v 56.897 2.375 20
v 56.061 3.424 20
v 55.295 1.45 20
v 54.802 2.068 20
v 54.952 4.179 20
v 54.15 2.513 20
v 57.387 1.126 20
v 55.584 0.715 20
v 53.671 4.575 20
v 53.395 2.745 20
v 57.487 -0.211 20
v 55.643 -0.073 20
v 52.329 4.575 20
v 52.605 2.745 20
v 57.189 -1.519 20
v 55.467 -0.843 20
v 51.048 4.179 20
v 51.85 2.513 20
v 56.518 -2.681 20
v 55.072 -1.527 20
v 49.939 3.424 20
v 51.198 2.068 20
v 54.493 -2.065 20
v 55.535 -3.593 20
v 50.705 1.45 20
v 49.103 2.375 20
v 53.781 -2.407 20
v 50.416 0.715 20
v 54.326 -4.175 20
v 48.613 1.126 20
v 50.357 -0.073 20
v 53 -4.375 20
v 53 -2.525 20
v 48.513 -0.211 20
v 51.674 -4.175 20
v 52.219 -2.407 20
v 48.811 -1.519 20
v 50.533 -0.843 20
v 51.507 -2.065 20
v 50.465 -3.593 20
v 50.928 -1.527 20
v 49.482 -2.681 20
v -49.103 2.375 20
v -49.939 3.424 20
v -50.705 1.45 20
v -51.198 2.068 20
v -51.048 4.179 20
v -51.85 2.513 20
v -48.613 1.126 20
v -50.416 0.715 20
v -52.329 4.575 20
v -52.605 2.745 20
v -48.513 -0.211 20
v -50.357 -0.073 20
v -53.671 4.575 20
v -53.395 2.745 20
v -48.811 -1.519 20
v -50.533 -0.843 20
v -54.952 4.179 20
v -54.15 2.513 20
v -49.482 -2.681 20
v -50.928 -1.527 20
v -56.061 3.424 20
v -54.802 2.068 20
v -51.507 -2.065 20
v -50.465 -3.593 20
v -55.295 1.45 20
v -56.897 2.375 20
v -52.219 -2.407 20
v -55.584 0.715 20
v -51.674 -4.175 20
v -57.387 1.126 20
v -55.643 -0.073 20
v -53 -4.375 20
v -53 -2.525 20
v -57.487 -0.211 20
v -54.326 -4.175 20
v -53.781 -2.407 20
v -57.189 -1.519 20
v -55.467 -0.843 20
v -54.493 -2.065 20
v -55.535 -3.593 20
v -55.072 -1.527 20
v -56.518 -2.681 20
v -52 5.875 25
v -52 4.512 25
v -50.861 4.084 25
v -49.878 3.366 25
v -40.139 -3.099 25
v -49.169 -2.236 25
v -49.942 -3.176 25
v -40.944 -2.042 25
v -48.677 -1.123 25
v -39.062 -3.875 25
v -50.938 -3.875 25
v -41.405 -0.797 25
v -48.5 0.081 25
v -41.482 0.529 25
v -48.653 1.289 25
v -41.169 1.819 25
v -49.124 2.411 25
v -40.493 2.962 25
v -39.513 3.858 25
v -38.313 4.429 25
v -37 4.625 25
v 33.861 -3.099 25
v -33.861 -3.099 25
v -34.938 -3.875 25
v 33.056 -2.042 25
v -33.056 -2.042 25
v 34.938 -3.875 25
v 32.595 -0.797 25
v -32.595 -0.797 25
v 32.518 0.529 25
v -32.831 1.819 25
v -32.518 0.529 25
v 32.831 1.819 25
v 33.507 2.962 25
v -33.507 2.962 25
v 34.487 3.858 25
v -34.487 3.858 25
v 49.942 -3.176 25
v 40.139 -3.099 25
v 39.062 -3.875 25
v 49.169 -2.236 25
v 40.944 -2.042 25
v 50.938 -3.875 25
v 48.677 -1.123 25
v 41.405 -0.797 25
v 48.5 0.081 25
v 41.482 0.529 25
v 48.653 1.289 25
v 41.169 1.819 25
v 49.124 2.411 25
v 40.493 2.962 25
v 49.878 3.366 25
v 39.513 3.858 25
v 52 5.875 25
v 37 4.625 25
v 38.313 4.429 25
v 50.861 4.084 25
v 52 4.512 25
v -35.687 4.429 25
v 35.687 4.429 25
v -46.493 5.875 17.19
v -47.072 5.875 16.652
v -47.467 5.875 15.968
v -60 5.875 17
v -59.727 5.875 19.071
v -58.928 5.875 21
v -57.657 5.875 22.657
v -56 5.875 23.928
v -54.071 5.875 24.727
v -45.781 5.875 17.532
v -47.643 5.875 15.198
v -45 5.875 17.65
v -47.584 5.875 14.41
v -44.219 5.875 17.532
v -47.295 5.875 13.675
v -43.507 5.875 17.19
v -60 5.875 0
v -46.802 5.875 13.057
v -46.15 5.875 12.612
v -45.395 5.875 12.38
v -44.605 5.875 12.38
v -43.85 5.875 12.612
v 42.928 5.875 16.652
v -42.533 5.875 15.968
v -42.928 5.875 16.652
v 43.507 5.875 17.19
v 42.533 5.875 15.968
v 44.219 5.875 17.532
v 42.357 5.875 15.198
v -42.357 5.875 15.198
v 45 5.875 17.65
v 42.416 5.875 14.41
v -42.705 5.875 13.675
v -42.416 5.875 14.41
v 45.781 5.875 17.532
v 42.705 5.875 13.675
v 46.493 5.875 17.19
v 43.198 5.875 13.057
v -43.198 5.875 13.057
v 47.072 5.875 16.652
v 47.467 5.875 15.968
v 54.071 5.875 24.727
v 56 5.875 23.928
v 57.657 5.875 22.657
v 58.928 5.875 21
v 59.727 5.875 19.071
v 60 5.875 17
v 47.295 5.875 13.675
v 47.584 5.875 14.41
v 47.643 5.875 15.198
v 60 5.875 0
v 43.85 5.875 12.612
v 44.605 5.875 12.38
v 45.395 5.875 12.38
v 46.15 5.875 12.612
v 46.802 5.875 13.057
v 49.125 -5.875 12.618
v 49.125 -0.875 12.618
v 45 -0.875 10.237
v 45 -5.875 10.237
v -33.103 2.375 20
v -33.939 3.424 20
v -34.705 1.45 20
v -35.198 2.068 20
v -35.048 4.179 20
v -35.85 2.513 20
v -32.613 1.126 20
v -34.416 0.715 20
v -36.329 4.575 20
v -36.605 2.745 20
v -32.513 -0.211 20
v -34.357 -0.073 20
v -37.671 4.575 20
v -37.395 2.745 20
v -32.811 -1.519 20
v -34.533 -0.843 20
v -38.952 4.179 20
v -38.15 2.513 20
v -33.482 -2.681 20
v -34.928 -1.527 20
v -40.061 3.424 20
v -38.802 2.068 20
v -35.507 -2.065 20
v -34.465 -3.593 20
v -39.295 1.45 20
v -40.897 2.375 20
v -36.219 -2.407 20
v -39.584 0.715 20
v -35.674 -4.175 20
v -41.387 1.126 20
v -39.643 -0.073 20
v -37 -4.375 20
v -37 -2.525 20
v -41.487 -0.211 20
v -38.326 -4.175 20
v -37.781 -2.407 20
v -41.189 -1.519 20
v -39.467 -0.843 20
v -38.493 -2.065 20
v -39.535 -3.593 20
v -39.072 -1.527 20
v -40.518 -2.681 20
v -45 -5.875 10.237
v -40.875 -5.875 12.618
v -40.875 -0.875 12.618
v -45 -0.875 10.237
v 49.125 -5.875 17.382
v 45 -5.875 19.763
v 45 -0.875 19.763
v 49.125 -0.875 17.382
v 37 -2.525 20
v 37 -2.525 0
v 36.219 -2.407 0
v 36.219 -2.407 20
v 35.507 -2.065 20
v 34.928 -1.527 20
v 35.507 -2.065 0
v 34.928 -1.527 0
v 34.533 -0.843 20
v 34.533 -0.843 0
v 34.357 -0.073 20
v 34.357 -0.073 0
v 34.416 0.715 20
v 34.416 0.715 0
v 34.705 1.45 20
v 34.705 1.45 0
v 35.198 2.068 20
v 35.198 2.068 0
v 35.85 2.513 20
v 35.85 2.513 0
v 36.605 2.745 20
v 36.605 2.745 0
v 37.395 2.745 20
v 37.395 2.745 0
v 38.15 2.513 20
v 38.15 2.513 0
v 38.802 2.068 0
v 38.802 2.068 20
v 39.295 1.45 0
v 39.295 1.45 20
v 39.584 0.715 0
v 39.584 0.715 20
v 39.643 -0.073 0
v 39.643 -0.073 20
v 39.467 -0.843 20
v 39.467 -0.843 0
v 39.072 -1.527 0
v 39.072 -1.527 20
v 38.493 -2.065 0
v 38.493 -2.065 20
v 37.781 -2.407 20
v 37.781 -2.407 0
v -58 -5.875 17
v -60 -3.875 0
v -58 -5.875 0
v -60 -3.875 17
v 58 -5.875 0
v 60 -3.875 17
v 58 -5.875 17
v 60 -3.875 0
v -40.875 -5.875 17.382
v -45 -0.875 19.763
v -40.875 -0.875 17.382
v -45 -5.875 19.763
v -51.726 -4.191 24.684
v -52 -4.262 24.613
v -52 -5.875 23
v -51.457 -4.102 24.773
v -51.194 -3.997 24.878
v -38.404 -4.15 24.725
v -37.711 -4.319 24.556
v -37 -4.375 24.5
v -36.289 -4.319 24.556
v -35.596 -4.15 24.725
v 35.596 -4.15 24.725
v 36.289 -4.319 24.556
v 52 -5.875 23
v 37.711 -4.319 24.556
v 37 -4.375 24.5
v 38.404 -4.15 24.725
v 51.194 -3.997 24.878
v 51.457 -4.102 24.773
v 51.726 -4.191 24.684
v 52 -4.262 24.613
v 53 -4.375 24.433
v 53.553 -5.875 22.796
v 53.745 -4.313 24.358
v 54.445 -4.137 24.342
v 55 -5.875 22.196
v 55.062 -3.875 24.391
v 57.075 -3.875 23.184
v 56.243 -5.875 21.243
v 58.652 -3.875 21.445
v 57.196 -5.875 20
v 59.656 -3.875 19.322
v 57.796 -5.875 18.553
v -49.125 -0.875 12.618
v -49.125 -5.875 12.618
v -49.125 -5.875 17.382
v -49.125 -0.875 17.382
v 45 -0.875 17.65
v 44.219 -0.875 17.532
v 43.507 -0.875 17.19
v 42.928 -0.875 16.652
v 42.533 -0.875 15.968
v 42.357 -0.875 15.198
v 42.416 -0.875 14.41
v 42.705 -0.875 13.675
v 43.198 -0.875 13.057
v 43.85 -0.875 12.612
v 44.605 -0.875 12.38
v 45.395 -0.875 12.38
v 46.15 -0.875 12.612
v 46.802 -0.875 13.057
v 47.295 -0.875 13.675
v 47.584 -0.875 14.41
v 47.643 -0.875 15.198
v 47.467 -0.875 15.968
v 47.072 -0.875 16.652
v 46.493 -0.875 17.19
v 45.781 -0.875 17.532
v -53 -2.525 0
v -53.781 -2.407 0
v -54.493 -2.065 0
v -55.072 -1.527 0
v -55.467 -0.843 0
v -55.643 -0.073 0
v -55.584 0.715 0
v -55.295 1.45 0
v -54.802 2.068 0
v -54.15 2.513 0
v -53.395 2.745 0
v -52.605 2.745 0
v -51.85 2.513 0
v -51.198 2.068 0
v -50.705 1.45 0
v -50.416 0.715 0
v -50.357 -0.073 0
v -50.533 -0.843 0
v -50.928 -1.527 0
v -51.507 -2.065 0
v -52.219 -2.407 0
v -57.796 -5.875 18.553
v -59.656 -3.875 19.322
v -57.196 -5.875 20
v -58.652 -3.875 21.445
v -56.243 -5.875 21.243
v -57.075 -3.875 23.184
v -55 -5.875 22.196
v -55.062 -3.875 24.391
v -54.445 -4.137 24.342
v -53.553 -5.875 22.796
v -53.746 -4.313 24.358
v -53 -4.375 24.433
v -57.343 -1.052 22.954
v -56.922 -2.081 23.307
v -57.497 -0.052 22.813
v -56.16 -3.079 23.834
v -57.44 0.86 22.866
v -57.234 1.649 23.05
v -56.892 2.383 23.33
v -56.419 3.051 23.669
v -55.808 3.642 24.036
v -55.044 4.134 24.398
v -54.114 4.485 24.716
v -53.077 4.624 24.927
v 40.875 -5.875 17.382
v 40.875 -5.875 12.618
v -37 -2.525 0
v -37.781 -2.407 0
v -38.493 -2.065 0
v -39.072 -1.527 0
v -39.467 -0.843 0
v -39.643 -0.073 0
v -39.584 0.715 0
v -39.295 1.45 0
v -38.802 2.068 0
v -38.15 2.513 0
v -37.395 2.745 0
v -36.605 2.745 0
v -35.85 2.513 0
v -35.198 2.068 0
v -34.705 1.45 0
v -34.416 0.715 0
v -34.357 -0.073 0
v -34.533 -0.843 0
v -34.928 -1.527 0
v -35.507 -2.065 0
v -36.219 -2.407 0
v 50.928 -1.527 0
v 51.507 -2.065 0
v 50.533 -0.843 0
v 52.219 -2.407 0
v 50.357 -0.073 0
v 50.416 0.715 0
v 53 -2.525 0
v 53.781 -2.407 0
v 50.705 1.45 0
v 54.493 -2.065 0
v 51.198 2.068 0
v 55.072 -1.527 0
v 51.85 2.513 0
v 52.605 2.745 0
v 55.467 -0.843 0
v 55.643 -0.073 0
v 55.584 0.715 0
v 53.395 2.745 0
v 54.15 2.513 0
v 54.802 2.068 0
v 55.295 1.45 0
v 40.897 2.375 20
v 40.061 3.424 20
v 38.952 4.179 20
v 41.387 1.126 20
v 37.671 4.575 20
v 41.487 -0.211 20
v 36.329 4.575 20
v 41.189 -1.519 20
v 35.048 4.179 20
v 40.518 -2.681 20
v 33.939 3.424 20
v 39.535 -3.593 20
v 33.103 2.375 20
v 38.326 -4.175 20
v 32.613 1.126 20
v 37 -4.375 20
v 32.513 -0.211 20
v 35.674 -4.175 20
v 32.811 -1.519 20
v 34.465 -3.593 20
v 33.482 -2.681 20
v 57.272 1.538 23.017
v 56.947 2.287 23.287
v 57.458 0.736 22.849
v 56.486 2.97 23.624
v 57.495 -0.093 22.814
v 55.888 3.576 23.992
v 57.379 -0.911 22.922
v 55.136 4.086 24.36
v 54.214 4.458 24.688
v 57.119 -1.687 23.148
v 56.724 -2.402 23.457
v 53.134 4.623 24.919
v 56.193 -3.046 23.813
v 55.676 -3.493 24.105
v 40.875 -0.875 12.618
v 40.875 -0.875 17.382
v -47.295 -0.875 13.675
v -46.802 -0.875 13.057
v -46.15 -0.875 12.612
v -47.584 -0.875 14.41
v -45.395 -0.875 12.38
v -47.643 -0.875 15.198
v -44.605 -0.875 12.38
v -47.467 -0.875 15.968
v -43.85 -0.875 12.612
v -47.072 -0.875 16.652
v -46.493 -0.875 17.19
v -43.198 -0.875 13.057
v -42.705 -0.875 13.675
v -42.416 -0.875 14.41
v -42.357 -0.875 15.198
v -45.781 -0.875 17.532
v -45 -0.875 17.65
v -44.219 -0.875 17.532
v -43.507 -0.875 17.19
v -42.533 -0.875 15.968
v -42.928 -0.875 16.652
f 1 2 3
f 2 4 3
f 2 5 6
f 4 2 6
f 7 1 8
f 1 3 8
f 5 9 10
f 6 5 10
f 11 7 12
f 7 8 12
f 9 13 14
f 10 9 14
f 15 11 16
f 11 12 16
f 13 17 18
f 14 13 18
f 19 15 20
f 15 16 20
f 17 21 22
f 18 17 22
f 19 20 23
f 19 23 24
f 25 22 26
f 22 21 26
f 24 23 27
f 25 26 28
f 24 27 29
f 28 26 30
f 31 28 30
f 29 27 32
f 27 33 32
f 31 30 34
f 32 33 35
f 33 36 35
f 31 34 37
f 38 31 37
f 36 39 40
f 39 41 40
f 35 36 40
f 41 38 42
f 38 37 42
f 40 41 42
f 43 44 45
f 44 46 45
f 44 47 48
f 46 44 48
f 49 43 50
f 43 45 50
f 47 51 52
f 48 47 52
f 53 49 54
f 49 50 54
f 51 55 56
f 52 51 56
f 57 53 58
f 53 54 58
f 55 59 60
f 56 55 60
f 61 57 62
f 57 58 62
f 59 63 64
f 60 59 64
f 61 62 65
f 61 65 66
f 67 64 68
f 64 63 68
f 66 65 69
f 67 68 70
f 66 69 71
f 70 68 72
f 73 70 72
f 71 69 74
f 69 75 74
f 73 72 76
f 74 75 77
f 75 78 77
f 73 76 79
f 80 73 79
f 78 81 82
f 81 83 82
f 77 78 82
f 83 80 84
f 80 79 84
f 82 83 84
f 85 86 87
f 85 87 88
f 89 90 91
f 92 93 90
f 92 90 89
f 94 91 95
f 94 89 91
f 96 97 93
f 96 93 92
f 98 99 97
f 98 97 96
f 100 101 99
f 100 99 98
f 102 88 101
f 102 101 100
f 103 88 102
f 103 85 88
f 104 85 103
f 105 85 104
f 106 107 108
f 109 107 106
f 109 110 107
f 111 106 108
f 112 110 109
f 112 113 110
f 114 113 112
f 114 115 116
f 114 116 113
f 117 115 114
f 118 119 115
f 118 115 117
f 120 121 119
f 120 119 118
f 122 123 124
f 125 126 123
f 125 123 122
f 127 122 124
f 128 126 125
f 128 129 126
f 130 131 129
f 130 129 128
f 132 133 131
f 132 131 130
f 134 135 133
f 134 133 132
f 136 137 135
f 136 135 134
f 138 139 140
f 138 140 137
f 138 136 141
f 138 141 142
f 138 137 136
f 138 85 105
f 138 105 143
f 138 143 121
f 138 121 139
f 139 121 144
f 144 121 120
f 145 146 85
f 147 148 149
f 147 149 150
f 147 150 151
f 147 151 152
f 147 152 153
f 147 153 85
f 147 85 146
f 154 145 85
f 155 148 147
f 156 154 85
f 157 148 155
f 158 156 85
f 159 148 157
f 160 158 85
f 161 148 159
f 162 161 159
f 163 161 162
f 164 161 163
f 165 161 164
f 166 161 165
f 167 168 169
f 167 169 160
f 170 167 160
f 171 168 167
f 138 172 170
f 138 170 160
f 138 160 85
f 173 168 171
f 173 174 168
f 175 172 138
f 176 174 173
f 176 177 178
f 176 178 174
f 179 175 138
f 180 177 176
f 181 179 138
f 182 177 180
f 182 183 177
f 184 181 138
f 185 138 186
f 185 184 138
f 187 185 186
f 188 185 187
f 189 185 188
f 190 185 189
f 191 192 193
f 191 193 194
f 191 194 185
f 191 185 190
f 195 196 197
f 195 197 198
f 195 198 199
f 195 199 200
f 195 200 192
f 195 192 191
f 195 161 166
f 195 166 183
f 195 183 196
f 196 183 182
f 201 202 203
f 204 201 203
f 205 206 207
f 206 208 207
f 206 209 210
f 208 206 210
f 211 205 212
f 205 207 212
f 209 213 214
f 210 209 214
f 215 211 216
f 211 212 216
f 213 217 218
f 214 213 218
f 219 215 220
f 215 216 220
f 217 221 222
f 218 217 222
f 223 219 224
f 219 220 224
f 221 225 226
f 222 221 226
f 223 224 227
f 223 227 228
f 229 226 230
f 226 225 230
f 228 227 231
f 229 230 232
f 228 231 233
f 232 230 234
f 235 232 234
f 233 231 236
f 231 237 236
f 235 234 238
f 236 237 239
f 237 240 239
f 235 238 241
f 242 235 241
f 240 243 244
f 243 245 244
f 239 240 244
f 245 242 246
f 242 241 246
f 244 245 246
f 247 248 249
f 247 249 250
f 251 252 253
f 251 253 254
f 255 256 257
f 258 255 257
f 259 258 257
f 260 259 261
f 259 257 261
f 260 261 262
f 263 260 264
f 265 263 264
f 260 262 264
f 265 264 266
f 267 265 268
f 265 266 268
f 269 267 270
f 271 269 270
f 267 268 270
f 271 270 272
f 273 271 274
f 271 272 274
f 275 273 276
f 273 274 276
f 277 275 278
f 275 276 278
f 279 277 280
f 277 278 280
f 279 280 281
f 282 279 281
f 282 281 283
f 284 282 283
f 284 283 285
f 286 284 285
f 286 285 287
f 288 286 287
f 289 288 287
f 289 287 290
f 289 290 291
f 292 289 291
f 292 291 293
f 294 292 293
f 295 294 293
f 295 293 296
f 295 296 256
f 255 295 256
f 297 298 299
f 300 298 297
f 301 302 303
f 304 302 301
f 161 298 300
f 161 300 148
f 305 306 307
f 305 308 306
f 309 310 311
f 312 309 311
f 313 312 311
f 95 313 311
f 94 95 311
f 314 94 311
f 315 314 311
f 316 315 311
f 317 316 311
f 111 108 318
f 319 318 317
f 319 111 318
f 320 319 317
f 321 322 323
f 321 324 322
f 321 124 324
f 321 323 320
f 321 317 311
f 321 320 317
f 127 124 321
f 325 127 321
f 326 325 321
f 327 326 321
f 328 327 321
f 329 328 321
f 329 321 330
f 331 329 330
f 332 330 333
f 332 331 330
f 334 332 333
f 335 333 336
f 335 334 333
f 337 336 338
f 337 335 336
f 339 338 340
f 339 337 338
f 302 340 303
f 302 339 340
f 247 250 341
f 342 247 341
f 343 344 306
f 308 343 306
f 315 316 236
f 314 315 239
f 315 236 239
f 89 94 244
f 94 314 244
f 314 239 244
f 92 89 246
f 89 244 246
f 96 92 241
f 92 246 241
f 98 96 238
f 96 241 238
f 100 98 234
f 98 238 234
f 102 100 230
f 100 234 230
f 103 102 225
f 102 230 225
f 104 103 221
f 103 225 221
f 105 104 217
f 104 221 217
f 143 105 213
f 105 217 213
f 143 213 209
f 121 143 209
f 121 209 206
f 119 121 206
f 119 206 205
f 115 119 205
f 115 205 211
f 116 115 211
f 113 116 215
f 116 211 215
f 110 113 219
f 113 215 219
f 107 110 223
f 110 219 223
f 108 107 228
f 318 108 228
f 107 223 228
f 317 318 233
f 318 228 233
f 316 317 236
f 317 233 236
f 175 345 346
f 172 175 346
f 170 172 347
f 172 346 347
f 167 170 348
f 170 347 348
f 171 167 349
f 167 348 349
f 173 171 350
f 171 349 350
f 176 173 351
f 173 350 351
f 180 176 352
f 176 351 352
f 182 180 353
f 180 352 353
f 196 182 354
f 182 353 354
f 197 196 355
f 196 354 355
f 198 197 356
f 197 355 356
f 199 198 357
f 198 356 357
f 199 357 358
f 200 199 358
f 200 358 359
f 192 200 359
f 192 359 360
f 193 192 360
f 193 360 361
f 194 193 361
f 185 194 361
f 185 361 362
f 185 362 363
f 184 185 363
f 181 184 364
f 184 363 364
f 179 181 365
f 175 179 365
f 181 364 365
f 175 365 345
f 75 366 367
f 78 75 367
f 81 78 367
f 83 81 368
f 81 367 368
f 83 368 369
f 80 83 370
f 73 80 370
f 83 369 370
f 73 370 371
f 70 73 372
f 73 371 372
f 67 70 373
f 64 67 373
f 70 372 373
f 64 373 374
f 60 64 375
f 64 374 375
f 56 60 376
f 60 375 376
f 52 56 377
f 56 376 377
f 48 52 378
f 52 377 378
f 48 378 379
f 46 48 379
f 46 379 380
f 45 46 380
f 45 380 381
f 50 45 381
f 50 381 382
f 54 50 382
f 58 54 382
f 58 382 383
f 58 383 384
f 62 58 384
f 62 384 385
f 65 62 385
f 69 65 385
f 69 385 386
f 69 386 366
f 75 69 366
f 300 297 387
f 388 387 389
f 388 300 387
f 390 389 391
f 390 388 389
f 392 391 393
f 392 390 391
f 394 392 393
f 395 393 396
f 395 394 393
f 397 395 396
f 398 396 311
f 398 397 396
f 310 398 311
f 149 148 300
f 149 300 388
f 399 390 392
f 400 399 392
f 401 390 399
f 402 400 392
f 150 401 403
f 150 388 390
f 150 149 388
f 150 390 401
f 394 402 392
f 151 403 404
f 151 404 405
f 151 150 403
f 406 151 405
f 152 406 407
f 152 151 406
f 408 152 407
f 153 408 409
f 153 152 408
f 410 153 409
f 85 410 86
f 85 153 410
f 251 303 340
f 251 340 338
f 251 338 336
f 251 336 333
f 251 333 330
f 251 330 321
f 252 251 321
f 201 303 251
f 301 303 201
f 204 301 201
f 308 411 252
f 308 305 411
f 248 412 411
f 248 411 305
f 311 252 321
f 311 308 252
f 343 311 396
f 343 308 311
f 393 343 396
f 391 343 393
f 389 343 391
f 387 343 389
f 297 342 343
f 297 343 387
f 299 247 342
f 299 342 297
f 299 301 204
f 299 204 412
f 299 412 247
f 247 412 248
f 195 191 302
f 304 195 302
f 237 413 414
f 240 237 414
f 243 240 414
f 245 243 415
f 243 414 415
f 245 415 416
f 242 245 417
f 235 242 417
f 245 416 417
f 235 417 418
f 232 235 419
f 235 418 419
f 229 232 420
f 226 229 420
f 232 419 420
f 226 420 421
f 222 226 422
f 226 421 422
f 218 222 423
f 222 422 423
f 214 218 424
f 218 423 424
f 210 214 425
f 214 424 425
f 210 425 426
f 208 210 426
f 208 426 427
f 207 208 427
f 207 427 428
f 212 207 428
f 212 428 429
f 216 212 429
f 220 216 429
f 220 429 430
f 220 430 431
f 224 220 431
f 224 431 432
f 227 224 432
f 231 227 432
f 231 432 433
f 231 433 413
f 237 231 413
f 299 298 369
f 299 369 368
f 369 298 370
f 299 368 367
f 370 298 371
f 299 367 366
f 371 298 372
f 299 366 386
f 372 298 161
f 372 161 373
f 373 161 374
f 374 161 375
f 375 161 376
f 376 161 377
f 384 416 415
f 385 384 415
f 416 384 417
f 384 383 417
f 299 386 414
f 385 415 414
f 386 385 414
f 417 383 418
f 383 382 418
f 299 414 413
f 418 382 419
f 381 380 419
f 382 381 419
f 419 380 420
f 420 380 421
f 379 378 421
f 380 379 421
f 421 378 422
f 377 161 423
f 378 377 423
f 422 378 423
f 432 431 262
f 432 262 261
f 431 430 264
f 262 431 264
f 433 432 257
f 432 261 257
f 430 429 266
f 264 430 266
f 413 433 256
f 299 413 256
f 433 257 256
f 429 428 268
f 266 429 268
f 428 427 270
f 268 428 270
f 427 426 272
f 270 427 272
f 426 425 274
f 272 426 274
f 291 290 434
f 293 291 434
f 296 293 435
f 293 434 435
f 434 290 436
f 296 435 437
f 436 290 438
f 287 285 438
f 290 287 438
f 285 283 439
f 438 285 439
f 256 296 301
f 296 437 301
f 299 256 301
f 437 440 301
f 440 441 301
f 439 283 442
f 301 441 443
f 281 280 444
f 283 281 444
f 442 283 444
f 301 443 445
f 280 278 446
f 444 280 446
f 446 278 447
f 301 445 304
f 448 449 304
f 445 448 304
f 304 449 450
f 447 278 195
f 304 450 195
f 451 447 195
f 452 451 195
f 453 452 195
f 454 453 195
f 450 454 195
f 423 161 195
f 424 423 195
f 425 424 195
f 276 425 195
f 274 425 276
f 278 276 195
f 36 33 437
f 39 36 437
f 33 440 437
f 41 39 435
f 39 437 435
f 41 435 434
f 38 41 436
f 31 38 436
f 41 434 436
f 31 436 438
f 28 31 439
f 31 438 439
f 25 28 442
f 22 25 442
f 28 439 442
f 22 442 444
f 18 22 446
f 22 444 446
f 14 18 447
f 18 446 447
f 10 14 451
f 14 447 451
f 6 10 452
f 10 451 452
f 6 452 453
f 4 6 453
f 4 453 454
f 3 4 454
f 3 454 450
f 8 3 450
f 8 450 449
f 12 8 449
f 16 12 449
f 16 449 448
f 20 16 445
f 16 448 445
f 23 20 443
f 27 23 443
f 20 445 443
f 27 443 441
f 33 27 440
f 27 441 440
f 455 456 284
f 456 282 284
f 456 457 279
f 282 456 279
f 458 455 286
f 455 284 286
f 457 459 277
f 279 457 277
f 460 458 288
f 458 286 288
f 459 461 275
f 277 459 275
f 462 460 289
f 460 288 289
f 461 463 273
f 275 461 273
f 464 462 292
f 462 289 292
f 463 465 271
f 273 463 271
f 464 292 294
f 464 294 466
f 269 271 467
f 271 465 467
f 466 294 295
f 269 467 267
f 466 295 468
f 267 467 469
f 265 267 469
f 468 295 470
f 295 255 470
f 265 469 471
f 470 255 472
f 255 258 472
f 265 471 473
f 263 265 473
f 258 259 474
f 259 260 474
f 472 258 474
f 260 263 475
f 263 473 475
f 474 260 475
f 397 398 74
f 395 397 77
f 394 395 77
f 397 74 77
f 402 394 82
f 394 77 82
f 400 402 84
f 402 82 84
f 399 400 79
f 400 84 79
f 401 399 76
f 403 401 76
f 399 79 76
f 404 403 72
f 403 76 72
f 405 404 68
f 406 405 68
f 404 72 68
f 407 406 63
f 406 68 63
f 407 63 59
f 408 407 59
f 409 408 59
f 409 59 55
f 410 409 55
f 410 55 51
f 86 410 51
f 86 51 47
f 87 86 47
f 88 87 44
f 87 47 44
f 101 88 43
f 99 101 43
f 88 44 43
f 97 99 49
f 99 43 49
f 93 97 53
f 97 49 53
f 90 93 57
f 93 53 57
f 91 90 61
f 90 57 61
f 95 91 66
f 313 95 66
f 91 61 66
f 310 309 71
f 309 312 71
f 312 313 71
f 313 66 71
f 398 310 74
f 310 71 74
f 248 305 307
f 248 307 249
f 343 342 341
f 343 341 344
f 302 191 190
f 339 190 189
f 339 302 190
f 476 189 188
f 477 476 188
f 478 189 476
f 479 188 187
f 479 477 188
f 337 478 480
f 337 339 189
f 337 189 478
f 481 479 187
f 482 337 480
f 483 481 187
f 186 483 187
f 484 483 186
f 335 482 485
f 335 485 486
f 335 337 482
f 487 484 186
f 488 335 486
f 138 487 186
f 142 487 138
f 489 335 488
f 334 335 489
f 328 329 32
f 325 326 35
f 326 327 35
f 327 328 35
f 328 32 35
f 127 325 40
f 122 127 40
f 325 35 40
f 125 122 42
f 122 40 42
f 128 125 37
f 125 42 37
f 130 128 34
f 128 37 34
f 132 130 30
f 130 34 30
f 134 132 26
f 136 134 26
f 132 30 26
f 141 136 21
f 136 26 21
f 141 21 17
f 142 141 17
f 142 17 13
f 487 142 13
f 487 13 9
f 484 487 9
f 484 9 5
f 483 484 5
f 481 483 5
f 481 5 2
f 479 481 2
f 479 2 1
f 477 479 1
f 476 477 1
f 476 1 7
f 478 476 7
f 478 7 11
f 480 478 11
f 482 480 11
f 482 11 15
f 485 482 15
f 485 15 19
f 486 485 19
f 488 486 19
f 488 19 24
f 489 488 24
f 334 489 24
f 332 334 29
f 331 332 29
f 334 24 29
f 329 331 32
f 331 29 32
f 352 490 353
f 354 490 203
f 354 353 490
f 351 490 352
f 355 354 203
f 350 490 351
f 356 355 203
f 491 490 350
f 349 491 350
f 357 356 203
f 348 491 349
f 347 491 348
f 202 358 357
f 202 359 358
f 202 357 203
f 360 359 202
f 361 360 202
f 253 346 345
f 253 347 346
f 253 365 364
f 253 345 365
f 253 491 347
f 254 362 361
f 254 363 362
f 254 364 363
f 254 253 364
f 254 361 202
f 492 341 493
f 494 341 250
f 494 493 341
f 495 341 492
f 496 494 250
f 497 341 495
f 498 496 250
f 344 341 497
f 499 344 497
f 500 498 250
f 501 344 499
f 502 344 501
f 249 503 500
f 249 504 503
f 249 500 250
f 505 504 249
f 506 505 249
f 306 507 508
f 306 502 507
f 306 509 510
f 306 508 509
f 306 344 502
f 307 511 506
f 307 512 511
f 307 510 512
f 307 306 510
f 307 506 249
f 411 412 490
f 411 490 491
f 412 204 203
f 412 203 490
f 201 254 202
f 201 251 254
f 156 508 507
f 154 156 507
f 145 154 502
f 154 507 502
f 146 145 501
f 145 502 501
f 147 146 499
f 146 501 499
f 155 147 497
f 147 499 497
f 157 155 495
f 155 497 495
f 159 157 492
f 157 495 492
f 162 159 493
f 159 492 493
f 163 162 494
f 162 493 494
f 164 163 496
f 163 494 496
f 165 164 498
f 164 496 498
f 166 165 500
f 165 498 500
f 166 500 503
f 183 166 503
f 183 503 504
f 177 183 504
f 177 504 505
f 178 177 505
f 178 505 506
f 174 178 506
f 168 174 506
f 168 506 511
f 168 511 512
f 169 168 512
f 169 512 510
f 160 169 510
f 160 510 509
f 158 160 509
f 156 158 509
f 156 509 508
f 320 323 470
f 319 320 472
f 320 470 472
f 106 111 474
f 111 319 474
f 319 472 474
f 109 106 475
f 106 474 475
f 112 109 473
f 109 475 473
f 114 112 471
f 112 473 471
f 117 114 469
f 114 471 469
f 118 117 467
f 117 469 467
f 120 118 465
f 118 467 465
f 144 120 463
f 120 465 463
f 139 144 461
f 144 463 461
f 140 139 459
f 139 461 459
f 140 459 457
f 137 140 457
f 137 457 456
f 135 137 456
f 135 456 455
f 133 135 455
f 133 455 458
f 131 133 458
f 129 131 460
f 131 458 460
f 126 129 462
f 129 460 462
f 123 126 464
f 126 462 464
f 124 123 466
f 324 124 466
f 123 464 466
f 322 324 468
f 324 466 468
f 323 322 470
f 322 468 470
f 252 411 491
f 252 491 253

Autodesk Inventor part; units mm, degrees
ref_plane "YZ Plane" through (0, 0, 0) normal (1, 0, 0) x (0, 1, 0)
ref_plane "XZ Plane" through (0, 0, 0) normal (0, 1, 0) x (-1, 0, 0)
ref_plane "XY Plane" through (0, 0, 0) normal (0, 0, 1) x (1, 0, 0)
sketch "Sketch1" plane through (0, 0, 0) normal (0, 0, 1) x (1, 0, 0)
  line L0 (60, -5.875) -> (-60, -5.875)
  line L1 (-60, -5.875) -> (-60, 5.875)
  line L2 (-60, 5.875) -> (60, 5.875)
  line L3 (60, 5.875) -> (60, -5.875)
  line L4 (60, -5.875) -> (-60, 5.875) construction
  line L5 (-60, -5.875) -> (60, 5.875) construction
  point P0 (0, 0)
  dimension "d0" = 120
  dimension "d1" = 11.75
extrude "Extrusion1" add sketch "Sketch1" along normal blind 25
fillet "Fillet1" radius 8 2 edges at (60, 0, 25) (-60, 0, 25)
chamfer "Chamfer1" distance 2 angle 45 5 edges at (60, -5.875, 8.5) (57.6569, -5.875, 22.6569) (0, -5.875, 25) (-57.6569, -5.875, 22.6569) (-60, -5.875, 8.5)
sketch "Sketch2" plane through (0, 0, 25) normal (0, 0, 1) x (1, 0, 0)
  line L0 (-53, 0.125) -> (-37, 0.125) construction
  line L1 (-52, -5.875) -> (52, -5.875) projected
  line L2 (-60, 5.875) -> (-60, -3.875) projected
  line L3 (37, 0.125) -> (53, 0.125) construction
  line L4 (60, -3.875) -> (60, 5.875) projected
  point P0 (-45, 0.125)
  point P1 (45, 0.125)
  dimension "d8" = 16
  dimension "d9" = 6
  dimension "d35" = 15
  dimension "d36" = 15
  dimension "d37" = 90
hole "Hole1" at (-53, 0.125, 25) at (-37, 0.125, 25) at (37, 0.125, 25) at (53, 0.125, 25) direction (0, 0, -1) diameter 5.3 end through all counterbore diameter 9 counterbore depth 5
sketch "Sketch3" plane through (-60, 5.875, 0) normal (0, 1, 0) x (1, 0, 0)
  point P0 (60, 0)
  point P1 (105, -15)
  point P2 (15, -15)
  point P3 (15, -25)
  point P4 (105, -25)
  dimension "d22" = 10
hole "Hole2" at (45, 5.875, 15) at (-45, 5.875, 15) direction (0, -1, 0) diameter 5.3 end through all
sketch "Sketch4" plane through (-58, -5.875, 0) normal (0, -1, 0) x (1, 0, 0)
  circle A0 centre (13, 15) radius 2.65 projected
  circle A1 centre (103, 15) radius 2.65 projected
  line L0 (0, 0) -> (0, 17) projected
  line L1 (0, 0) -> (116, 0) projected
  line L2 (116, 17) -> (116, 0) projected
  arc A2 (116, 17) -> (110, 23) centre (110, 17) ccw projected
  line L3 (6, 23) -> (110, 23) projected
  arc A3 (6, 23) -> (0, 17) centre (6, 17) ccw projected
  line L4 (107.125, 12.6184) -> (103, 10.2369)
  line L5 (103, 10.2369) -> (98.875, 12.6184)
  line L6 (98.875, 12.6184) -> (98.875, 17.3816)
  line L7 (98.875, 17.3816) -> (103, 19.7631)
  line L8 (103, 19.7631) -> (107.125, 17.3816)
  line L9 (107.125, 17.3816) -> (107.125, 12.6184)
  line L10 (8.875, 17.3816) -> (13, 19.7631)
  line L11 (13, 19.7631) -> (17.125, 17.3816)
  line L12 (17.125, 17.3816) -> (17.125, 12.6184)
  line L13 (17.125, 12.6184) -> (13, 10.2369)
  line L14 (13, 10.2369) -> (8.875, 12.6184)
  line L15 (8.875, 12.6184) -> (8.875, 17.3816)
  point P0 (58, 0)
  dimension "d30" = 8.25
extrude "Extrusion2" cut sketch "Sketch4" against normal blind 5 contours A0 | A1 | L4 L5 L6 L7 L8 L9 | L10 L11 L12 L13 L14 L15
equation "\"d35\" = d36"
properties part number "Door Bar Brace Mount" material "ABS Plastic"
